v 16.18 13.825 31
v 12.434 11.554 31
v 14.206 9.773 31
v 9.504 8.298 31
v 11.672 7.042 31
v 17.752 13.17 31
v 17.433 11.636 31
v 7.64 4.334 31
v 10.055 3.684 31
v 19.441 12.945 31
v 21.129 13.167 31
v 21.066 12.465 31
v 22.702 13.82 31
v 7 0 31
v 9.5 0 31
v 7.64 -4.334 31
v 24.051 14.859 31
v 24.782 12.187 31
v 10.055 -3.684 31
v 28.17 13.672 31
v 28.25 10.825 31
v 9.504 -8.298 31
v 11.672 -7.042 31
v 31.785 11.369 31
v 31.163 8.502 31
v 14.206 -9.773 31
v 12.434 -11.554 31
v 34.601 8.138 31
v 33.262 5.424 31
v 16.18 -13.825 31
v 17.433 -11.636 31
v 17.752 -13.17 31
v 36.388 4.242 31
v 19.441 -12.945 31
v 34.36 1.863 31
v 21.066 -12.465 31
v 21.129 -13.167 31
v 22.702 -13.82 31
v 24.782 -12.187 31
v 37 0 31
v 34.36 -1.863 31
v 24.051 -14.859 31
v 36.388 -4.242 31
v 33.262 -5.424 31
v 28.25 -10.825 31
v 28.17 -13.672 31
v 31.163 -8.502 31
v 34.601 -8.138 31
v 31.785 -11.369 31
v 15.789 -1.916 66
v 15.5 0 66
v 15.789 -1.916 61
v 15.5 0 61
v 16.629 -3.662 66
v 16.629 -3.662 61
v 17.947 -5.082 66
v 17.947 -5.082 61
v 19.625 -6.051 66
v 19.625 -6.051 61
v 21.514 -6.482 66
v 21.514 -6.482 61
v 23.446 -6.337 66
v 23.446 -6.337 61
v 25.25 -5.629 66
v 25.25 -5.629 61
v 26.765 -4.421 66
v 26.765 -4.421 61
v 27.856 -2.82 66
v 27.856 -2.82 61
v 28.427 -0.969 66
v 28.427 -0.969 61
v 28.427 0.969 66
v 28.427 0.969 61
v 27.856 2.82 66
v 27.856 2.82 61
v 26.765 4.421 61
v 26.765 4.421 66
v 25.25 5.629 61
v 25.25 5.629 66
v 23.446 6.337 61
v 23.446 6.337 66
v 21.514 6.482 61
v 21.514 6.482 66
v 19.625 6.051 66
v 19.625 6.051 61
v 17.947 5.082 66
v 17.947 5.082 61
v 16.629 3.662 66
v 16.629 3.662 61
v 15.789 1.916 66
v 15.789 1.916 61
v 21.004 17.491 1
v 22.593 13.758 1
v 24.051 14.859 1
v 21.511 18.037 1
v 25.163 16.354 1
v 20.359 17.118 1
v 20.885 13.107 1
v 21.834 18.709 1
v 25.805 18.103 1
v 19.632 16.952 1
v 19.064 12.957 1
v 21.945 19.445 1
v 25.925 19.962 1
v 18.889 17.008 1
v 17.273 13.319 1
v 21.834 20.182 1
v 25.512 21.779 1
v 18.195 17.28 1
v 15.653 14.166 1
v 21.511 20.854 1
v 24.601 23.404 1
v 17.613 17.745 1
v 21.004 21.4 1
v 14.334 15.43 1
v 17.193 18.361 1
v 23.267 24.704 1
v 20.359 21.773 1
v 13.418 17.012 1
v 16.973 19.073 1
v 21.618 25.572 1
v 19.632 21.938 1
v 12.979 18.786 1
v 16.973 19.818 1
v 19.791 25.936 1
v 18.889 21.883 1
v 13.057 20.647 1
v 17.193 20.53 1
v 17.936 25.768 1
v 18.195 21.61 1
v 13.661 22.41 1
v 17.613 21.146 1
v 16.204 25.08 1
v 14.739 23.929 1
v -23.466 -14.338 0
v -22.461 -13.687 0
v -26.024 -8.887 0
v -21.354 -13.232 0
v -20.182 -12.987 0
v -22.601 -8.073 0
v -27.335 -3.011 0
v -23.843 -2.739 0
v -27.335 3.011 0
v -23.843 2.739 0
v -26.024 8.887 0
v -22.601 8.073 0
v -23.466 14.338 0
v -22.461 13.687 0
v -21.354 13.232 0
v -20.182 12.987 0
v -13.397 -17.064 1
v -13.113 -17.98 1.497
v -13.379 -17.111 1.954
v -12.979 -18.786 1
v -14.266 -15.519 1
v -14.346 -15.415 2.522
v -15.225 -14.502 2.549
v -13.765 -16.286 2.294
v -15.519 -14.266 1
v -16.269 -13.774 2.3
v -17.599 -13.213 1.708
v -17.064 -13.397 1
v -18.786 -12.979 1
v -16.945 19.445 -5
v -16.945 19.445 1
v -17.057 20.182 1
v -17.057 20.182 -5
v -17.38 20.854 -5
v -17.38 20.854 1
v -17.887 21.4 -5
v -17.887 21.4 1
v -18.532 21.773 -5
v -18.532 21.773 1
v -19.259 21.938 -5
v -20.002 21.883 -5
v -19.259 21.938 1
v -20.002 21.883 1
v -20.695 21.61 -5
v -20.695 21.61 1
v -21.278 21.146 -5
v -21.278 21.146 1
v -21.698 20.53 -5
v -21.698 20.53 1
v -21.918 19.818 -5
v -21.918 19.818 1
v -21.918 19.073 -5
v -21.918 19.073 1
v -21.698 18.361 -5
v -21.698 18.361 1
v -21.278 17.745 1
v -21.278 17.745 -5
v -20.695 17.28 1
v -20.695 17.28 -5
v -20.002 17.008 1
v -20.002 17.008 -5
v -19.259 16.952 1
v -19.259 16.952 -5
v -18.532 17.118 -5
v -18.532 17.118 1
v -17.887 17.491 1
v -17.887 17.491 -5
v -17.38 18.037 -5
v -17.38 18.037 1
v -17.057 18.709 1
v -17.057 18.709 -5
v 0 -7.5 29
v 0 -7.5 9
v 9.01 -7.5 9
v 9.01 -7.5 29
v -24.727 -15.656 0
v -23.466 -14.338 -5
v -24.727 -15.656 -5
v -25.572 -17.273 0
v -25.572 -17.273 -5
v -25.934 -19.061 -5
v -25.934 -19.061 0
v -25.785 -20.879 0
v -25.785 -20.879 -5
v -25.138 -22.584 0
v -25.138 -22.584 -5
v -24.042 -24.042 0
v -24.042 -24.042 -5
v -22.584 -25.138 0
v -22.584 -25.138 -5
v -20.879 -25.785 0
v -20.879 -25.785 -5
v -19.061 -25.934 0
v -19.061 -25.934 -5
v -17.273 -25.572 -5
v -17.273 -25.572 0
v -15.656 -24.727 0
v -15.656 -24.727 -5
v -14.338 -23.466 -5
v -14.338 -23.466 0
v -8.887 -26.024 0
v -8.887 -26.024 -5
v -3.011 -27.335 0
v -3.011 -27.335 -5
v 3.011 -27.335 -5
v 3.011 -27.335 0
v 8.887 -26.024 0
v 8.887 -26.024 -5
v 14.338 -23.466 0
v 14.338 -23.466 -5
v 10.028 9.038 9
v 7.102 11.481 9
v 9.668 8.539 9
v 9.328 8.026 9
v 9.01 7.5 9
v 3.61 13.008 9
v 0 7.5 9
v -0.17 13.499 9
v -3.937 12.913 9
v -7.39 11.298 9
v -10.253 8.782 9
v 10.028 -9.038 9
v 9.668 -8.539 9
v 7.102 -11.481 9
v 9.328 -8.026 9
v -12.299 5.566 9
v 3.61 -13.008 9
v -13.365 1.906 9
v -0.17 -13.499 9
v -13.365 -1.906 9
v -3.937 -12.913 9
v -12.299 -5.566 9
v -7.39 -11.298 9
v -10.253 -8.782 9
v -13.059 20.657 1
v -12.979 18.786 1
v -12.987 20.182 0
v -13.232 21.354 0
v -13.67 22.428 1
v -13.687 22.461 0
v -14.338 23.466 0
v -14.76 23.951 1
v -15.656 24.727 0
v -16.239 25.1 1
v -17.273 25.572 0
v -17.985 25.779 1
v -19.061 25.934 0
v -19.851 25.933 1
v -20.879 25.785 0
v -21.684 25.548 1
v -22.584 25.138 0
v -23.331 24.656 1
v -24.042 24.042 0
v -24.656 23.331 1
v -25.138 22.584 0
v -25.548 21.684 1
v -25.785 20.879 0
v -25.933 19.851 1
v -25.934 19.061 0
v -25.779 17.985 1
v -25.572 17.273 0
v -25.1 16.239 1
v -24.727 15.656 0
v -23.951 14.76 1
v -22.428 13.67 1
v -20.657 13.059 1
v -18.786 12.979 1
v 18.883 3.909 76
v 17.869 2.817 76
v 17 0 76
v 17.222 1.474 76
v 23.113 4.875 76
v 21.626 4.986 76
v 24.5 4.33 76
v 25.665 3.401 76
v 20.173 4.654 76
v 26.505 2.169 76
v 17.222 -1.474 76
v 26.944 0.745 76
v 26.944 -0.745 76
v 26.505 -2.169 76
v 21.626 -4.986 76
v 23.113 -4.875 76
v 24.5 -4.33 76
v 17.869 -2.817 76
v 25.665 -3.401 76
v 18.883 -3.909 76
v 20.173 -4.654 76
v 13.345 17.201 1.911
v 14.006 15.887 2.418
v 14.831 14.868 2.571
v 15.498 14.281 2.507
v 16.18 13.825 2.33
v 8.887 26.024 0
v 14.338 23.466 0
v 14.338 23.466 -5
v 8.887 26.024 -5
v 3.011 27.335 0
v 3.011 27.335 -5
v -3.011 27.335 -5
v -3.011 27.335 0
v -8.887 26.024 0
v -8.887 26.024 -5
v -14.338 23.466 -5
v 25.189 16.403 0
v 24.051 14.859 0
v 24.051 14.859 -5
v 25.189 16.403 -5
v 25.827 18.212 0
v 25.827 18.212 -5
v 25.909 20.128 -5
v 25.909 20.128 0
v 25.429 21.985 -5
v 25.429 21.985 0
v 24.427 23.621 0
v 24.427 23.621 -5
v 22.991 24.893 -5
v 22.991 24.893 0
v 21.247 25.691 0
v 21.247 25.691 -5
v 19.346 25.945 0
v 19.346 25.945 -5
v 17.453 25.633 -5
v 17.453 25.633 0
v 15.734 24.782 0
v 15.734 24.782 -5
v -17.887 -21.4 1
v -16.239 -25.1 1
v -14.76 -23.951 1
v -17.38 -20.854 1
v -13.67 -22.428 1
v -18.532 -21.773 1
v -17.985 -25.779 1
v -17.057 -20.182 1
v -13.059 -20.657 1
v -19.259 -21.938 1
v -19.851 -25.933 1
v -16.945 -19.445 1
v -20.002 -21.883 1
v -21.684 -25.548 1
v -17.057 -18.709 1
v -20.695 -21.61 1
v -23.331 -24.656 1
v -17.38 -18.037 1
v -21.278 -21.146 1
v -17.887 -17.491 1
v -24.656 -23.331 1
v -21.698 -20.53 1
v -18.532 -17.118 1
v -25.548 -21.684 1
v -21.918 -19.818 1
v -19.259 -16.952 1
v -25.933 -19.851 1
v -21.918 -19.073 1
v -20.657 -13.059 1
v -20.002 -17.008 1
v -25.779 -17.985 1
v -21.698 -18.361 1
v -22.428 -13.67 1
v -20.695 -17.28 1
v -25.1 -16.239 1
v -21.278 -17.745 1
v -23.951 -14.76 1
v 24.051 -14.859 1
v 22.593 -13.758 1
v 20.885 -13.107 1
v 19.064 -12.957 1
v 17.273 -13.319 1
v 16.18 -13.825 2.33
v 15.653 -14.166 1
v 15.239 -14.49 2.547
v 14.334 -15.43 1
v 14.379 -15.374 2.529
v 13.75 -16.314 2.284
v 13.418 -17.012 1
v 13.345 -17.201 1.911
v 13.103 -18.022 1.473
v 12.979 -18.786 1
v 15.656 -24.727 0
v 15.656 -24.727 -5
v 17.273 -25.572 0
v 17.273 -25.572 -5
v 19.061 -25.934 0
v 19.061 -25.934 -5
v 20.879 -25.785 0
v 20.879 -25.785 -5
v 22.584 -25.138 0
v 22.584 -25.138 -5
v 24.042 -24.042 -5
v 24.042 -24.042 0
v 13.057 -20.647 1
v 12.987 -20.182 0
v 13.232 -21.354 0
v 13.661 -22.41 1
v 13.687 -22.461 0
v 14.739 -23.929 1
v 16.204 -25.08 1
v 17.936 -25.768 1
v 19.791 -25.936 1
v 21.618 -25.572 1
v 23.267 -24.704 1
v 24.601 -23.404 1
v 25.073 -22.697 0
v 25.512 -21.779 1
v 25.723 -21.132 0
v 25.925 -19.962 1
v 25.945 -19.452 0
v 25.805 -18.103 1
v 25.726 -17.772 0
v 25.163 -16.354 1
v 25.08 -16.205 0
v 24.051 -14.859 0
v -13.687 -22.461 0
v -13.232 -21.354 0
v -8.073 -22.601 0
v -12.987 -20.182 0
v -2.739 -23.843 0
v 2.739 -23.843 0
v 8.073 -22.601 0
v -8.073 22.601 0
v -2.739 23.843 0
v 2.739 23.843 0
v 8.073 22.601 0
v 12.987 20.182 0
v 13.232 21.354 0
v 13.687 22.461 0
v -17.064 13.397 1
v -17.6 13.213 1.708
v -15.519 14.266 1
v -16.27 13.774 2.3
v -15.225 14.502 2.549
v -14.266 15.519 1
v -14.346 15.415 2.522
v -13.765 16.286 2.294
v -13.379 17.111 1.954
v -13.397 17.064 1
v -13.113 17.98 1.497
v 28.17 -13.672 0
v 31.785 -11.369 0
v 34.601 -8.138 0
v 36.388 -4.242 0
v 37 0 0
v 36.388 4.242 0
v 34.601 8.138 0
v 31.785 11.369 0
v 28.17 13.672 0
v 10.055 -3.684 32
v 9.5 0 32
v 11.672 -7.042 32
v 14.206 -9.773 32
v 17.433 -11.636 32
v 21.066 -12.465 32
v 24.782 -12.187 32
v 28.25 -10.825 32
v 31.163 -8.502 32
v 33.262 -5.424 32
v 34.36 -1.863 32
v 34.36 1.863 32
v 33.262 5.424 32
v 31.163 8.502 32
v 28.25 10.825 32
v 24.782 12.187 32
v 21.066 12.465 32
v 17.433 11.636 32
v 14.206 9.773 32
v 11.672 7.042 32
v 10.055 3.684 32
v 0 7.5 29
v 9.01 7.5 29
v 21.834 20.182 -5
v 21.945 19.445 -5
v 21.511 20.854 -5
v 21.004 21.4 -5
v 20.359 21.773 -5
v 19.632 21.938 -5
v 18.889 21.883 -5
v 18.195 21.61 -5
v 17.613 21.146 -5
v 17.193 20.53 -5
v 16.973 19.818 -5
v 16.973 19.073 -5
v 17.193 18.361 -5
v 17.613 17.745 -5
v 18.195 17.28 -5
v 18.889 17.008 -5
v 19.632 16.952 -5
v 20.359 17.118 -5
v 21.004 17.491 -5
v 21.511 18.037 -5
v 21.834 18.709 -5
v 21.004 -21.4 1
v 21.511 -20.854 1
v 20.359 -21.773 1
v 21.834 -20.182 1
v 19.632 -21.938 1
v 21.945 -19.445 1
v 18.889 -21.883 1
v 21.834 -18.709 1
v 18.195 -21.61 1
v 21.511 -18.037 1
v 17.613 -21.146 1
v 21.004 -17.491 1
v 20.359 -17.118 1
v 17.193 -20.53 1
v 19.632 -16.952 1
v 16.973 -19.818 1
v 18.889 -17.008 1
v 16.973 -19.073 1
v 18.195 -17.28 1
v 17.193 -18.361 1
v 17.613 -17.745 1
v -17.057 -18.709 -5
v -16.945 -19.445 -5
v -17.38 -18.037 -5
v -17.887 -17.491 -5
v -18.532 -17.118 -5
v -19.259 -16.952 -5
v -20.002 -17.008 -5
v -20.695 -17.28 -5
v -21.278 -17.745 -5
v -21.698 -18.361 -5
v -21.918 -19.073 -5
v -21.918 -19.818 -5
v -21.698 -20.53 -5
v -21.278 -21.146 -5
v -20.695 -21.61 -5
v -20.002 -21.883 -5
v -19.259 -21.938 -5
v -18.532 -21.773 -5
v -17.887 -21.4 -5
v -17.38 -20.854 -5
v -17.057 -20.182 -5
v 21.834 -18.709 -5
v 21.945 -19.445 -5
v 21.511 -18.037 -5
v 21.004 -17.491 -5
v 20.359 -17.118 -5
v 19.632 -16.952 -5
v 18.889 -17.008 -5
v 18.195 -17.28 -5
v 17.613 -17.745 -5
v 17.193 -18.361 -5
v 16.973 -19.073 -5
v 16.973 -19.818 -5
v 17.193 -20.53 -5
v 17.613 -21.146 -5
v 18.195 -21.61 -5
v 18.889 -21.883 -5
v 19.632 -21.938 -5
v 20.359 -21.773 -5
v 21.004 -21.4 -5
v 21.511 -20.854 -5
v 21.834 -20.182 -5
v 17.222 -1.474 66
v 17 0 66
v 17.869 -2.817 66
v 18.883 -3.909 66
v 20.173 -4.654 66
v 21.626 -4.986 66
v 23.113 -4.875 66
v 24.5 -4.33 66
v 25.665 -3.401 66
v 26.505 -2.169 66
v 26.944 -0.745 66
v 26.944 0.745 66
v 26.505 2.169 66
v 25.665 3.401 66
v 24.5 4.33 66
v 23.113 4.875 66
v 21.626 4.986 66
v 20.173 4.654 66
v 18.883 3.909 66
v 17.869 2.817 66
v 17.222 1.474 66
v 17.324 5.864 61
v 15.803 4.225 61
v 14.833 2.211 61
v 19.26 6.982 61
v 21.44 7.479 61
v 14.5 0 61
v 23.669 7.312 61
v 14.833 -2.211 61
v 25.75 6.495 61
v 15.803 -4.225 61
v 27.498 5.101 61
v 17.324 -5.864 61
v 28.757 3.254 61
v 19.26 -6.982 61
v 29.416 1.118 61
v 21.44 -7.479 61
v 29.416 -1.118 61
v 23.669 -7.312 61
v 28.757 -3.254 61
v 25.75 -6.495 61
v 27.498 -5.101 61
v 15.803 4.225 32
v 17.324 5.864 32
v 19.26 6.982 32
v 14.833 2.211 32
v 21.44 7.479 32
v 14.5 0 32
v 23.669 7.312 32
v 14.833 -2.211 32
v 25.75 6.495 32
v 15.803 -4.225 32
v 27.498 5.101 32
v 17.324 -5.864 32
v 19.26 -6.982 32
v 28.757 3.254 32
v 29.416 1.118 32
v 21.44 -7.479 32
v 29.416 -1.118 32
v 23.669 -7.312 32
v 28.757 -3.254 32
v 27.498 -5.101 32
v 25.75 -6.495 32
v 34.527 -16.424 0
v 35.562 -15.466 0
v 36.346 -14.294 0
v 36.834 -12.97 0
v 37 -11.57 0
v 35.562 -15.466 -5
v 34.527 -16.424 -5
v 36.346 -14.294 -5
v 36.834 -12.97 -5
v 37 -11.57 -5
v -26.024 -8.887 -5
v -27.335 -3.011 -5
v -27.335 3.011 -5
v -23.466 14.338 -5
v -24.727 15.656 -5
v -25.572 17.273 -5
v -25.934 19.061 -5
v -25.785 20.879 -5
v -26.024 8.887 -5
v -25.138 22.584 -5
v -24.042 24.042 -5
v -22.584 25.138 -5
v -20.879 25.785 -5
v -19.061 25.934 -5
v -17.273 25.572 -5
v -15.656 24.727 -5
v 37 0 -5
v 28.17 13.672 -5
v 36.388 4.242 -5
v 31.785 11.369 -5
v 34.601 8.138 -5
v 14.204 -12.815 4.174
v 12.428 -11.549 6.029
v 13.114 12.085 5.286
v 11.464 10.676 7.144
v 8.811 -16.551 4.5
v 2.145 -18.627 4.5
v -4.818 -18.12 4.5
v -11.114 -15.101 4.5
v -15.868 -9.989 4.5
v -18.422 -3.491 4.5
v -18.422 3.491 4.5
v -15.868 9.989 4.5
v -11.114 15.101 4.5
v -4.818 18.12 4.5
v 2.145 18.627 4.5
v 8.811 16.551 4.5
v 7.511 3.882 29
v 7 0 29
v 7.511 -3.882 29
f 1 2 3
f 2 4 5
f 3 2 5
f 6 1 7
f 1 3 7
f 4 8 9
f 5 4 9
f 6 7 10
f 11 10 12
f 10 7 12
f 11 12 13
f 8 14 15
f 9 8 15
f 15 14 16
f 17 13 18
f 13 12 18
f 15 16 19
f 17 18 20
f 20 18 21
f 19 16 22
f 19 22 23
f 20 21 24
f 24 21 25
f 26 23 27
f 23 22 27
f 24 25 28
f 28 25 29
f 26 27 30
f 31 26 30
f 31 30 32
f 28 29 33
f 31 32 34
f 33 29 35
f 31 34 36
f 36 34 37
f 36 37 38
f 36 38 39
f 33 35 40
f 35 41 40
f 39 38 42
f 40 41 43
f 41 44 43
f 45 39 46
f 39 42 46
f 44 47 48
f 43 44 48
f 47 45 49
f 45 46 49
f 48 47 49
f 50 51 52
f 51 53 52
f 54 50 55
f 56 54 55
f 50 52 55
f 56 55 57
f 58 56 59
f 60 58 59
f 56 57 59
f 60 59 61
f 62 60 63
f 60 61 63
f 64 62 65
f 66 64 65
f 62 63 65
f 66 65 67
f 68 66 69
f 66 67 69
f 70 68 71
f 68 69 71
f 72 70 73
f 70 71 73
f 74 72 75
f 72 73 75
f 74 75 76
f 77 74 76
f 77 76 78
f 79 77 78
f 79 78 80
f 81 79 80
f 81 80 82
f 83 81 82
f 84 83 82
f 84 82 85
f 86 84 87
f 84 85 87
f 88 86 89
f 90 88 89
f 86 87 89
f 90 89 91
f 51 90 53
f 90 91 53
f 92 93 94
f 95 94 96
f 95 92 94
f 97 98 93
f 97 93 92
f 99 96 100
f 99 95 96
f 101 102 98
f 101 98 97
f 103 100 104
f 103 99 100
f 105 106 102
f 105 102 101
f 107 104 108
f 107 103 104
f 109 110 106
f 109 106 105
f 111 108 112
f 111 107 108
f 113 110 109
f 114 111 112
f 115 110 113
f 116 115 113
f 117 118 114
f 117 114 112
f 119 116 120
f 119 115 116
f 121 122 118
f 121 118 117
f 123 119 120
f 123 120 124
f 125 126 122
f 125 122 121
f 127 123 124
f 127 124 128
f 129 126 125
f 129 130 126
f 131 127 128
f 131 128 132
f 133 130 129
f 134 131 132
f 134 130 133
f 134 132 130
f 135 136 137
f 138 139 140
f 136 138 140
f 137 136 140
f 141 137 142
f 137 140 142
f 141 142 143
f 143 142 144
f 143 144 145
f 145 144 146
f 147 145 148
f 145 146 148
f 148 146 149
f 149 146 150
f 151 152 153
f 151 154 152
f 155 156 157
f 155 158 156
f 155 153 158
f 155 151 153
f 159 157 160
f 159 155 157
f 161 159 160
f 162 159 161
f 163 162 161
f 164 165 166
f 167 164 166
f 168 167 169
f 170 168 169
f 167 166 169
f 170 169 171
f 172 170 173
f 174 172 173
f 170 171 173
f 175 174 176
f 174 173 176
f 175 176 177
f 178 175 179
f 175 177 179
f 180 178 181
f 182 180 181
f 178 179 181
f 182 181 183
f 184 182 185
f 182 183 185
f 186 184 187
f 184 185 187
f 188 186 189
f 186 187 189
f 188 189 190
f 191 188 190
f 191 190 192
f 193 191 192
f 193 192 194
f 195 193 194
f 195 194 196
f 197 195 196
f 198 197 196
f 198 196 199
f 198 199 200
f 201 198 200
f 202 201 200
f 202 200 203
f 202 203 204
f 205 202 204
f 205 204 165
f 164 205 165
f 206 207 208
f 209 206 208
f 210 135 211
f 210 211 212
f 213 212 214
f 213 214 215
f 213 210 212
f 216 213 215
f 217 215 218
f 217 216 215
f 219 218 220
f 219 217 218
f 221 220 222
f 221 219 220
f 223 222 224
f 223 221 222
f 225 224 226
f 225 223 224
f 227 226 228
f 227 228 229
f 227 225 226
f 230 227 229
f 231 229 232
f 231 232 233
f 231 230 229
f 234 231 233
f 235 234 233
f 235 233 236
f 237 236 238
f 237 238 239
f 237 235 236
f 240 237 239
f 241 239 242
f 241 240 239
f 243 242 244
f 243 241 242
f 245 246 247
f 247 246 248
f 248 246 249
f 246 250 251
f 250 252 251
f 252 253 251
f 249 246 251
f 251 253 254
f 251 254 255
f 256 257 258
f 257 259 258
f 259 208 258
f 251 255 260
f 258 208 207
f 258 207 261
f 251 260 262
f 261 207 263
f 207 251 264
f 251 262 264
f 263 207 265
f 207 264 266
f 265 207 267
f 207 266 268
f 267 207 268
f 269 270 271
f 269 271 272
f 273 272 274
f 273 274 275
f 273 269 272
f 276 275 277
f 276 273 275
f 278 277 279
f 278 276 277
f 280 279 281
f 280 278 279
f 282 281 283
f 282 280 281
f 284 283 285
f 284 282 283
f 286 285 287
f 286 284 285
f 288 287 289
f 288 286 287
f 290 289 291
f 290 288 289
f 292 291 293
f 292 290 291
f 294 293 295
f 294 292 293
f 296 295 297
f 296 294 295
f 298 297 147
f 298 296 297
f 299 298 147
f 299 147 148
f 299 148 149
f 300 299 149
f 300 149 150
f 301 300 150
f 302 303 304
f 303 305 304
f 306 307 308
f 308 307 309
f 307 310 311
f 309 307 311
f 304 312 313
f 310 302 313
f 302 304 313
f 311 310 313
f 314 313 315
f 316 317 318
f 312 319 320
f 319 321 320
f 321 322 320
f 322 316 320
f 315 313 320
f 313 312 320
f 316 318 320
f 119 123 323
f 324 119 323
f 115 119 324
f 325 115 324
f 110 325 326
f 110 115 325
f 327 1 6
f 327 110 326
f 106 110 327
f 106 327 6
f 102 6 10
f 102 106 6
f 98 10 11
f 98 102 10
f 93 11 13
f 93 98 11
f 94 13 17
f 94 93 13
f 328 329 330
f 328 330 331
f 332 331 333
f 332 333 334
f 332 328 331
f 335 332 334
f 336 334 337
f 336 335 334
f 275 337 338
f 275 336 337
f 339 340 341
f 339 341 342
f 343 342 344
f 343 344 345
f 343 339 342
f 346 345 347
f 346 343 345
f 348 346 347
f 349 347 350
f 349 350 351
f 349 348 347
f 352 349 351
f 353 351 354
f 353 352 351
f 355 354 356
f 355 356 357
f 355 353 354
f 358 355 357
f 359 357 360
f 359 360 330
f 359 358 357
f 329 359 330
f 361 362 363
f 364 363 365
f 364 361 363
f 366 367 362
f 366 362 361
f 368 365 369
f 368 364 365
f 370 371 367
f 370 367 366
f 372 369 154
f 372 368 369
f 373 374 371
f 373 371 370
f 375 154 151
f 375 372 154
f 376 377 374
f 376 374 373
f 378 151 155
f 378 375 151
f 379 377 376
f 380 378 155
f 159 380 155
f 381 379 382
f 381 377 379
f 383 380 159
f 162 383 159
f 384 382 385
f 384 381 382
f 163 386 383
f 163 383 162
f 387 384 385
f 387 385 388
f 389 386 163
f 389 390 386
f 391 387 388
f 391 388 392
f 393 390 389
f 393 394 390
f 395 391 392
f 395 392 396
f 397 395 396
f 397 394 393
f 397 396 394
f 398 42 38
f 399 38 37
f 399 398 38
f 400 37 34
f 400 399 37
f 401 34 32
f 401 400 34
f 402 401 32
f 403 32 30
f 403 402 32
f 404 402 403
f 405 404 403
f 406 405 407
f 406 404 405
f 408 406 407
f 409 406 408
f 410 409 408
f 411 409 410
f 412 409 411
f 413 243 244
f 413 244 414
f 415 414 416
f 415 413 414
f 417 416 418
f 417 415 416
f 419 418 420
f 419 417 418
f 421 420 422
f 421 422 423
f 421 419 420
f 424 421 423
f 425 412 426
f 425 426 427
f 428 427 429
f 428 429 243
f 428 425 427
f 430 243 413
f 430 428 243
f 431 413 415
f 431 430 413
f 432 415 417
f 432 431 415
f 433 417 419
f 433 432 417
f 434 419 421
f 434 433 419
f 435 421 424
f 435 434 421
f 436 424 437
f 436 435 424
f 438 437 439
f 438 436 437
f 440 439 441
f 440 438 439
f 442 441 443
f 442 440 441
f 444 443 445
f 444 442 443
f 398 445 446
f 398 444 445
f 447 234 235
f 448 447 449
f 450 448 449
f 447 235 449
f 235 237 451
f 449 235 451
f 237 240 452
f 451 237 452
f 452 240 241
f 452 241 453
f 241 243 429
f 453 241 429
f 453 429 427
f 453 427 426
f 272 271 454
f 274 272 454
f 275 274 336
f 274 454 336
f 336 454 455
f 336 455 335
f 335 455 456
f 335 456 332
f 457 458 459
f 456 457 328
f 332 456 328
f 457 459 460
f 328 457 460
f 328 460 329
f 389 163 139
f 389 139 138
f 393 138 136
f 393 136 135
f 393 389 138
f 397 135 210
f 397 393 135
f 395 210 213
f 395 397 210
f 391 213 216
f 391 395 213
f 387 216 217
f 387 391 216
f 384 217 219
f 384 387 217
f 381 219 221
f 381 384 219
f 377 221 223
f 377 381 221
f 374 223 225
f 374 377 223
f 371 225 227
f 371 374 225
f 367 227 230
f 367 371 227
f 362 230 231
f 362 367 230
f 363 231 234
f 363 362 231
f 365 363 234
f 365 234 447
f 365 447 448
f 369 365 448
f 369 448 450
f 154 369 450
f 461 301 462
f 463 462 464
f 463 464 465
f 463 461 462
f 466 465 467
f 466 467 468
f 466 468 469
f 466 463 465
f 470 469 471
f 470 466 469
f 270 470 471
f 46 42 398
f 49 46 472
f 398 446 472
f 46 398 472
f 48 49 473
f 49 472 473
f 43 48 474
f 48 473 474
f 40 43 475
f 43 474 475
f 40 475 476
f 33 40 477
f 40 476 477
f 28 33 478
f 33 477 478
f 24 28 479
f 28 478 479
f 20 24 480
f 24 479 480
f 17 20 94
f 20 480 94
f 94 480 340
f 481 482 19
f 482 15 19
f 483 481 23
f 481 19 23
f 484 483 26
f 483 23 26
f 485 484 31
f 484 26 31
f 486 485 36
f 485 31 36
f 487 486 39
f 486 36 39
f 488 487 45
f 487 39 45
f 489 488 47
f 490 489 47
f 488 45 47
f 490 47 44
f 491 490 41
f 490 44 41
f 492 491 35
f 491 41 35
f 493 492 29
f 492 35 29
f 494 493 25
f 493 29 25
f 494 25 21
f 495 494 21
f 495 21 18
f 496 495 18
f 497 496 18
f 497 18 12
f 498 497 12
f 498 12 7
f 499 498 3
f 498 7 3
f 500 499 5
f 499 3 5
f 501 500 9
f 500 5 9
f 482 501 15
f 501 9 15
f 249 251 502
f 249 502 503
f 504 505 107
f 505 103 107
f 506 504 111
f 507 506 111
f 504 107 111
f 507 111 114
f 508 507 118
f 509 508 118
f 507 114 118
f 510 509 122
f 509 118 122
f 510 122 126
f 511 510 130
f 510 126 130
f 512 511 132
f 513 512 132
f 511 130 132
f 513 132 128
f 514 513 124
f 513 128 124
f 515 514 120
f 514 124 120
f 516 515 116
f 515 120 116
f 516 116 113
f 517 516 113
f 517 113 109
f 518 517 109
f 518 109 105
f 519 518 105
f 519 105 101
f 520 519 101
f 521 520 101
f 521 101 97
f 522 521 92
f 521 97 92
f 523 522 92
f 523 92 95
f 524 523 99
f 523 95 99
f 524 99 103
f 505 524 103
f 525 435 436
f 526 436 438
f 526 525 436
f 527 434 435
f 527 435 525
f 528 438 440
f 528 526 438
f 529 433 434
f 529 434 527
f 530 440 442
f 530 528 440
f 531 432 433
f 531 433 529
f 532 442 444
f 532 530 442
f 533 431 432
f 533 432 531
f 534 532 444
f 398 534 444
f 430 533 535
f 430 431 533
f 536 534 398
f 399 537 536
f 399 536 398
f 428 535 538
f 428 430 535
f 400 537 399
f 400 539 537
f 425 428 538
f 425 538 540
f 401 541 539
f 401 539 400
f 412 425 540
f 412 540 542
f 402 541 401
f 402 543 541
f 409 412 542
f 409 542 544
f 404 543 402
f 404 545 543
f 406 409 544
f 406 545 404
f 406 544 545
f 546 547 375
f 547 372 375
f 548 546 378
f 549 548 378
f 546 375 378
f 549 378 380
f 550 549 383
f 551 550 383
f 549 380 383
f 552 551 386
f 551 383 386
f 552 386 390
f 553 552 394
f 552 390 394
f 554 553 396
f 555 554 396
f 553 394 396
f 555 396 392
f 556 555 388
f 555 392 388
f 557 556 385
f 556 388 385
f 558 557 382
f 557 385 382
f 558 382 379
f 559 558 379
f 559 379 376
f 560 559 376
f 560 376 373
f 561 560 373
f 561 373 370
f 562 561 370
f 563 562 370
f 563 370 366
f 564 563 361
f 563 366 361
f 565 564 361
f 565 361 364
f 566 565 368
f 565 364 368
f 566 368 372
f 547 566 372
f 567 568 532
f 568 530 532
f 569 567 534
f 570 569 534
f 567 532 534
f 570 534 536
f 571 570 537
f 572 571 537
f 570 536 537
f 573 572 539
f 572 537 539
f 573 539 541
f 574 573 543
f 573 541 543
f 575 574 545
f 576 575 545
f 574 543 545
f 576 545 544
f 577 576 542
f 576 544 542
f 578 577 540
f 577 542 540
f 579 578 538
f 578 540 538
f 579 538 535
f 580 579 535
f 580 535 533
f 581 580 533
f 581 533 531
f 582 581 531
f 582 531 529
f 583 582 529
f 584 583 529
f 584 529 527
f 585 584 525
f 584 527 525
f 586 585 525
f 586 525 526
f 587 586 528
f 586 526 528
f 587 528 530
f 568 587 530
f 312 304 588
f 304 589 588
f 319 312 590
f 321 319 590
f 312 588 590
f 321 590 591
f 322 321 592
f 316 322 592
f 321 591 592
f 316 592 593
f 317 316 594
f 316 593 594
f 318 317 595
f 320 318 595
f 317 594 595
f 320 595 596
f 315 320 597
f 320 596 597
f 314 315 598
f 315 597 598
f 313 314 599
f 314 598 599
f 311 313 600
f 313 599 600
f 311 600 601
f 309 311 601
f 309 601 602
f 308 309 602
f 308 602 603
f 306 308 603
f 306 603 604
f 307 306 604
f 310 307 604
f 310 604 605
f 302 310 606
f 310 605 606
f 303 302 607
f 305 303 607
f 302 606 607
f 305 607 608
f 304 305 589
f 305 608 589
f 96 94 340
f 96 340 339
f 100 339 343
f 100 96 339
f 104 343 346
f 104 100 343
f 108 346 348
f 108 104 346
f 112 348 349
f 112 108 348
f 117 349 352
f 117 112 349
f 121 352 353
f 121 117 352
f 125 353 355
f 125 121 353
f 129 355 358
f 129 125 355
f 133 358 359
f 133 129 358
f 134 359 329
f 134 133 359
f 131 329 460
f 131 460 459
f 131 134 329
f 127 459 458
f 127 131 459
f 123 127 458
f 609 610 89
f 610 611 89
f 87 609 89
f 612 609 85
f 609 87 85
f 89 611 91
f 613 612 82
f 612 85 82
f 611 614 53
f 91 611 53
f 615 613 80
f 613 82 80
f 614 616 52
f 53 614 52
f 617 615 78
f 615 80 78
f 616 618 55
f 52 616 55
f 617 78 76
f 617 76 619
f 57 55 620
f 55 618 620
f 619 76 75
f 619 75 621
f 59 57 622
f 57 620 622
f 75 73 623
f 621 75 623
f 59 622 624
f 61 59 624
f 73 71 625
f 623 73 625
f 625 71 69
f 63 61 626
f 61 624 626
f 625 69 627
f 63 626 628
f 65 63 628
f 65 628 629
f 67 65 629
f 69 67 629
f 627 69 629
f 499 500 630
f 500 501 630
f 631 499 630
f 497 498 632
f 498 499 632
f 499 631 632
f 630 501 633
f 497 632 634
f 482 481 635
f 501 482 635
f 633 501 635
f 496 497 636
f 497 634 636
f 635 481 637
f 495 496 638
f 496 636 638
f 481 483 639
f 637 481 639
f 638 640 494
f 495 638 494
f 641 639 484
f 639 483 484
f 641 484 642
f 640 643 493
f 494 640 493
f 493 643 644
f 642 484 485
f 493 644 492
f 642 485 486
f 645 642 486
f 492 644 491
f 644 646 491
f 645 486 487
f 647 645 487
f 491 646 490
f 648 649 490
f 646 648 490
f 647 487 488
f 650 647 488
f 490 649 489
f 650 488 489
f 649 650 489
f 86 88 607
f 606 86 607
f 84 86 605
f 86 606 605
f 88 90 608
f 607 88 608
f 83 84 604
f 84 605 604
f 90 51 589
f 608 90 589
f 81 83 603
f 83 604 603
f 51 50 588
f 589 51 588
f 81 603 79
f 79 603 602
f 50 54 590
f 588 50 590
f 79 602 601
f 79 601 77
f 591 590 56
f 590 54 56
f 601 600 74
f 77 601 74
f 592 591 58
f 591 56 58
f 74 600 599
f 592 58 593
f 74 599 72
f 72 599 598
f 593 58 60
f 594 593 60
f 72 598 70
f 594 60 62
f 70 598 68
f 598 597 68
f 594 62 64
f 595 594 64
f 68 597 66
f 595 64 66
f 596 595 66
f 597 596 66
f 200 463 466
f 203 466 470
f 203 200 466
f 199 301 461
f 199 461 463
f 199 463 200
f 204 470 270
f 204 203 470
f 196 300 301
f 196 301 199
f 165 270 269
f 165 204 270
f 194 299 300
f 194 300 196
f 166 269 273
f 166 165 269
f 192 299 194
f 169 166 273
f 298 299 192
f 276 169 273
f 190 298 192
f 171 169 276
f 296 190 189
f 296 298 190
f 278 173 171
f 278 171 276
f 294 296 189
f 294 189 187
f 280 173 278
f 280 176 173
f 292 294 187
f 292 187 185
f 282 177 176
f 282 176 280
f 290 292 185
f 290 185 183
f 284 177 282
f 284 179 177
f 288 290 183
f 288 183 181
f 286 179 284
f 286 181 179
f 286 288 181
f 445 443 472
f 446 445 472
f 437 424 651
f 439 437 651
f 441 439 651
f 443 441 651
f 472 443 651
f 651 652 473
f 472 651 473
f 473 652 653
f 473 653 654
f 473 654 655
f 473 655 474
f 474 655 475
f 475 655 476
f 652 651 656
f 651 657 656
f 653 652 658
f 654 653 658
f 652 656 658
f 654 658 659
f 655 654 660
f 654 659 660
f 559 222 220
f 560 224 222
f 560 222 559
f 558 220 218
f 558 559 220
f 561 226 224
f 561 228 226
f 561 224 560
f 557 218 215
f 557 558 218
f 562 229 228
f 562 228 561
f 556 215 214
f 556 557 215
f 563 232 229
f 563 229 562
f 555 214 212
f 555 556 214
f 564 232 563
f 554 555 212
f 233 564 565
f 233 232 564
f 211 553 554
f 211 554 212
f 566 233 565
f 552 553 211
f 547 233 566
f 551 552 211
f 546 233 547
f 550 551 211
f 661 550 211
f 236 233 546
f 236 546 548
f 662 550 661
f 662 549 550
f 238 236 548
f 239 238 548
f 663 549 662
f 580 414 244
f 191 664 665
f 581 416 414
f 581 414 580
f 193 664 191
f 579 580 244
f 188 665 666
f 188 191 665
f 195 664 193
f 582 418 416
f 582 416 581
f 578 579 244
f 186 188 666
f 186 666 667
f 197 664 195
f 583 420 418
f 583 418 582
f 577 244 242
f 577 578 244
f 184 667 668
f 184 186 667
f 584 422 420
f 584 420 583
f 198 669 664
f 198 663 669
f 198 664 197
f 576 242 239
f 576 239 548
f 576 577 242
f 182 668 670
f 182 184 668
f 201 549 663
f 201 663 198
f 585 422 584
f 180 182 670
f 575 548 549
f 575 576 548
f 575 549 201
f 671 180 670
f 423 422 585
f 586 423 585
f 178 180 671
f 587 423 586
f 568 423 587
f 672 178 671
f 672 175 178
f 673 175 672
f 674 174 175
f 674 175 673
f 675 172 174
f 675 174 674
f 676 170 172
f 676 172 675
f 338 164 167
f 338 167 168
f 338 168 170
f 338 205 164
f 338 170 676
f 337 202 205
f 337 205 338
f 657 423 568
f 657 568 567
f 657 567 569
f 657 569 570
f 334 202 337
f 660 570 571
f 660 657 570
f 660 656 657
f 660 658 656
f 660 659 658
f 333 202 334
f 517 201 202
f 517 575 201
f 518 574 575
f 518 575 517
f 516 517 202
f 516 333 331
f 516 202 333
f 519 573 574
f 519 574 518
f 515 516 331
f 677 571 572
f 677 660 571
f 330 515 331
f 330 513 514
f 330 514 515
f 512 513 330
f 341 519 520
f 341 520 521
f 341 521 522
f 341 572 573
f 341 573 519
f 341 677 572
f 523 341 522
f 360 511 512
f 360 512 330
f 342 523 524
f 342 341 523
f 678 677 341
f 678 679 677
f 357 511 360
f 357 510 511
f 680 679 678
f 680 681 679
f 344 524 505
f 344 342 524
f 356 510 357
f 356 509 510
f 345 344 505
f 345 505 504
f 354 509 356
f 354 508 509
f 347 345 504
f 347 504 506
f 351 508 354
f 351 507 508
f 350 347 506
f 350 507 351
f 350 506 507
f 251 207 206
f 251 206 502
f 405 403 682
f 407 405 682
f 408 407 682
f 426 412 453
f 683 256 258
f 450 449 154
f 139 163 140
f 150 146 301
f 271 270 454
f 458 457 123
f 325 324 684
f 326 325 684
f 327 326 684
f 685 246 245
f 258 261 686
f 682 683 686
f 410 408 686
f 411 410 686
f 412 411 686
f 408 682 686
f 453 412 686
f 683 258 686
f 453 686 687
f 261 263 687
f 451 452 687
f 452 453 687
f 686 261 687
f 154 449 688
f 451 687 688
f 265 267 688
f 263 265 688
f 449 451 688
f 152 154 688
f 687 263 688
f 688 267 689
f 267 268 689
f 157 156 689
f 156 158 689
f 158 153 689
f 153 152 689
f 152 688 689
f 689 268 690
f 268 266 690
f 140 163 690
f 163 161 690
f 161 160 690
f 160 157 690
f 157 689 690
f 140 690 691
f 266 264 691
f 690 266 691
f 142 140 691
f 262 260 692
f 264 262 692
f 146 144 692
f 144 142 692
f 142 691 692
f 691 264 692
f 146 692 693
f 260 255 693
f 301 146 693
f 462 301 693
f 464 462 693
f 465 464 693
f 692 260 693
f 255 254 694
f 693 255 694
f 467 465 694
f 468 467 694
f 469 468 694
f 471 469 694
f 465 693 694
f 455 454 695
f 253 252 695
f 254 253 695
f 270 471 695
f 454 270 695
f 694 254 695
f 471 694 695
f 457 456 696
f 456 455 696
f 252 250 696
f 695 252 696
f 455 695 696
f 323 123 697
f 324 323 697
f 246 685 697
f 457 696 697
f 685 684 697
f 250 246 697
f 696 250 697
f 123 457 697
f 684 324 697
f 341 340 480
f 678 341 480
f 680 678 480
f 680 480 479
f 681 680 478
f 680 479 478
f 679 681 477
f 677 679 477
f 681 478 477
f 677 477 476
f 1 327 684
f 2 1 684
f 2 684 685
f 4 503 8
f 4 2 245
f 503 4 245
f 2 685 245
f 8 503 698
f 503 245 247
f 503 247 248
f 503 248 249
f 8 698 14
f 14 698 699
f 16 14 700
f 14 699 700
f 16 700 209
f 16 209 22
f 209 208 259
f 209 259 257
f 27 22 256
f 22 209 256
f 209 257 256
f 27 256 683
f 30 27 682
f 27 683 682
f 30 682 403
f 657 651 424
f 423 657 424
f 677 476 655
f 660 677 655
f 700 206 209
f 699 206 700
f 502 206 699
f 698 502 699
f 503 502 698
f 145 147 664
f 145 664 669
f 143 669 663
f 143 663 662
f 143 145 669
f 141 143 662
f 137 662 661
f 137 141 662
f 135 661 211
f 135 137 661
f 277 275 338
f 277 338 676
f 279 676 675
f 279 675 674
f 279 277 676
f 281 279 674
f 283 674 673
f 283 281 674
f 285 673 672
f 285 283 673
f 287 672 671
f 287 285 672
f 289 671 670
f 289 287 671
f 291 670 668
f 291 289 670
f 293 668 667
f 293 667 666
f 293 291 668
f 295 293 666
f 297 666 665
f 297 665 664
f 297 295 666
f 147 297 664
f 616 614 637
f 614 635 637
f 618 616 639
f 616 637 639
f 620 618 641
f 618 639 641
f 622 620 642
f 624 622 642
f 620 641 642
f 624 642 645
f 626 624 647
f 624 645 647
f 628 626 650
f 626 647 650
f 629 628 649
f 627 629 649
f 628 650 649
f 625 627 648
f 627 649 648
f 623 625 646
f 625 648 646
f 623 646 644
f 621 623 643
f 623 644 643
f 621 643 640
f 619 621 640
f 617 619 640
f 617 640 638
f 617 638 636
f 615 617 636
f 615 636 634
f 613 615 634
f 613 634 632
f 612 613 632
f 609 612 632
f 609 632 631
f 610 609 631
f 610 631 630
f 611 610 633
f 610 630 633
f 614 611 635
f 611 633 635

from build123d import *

# Parameters (mm, degrees)
SKETCH1_R           = 2.5
BOSS_EXTRUDE1_DEPTH = 5
BOSS_EXTRUDE2_START = -5
BOSS_EXTRUDE2_DEPTH = 5
SKETCH8_W           = 9.009618943
SKETCH8_H           = 15
BOSS_EXTRUDE3_DEPTH = 20
SKETCH1_3_R         = 6.5
CUT_EXTRUDE1_DEPTH  = 89.888975736
FILLET1_R           = 6
BOSS_EXTRUDE4_START = 1
SKETCH1_4_R         = 6.5
SKETCH1_4_R_2       = 2.5
BOSS_EXTRUDE4_DEPTH = 1


with BuildPart() as part:
    # Sketch1 → Boss-Extrude1 (new body)
    with BuildSketch(Plane(origin=(0, 0, 0), x_dir=(0, 1, 0), z_dir=(0, 0, 1))):
        with BuildLine():
            ThreePointArc((23.466233734, -14.338266086), (27.5, 0), (23.466233734, 14.338266086))
            ThreePointArc((23.466233734, 14.338266086), (24.04163056, 24.04163056), (14.338266086, 23.466233734))
            ThreePointArc((14.338266086, 23.466233734), (0, 27.5), (-14.338266086, 23.466233734))
            ThreePointArc((-14.338266086, 23.466233734), (-24.04163056, 24.04163056), (-23.466233734, 14.338266086))
            ThreePointArc((-23.466233734, 14.338266086), (-27.5, 0), (-23.466233734, -14.338266086))
            ThreePointArc((-23.466233734, -14.338266086), (-24.04163056, -24.04163056), (-14.338266086, -23.466233734))
            ThreePointArc((-14.338266086, -23.466233734), (0, -27.5), (14.338266086, -23.466233734))
            ThreePointArc((14.338266086, -23.466233734), (24.04163056, -24.04163056), (23.466233734, -14.338266086))
        make_face()
        with Locations(Location((-19.445436483, 19.445436483, 0), (0, 0, 270))):
            Circle(SKETCH1_R, mode=Mode.SUBTRACT)
        with Locations(Location((19.445436483, 19.445436483, 0), (0, 0, 270))):
            Circle(SKETCH1_R, mode=Mode.SUBTRACT)
        with Locations(Location((19.445436483, -19.445436483, 0), (0, 0, 270))):
            Circle(SKETCH1_R, mode=Mode.SUBTRACT)
        with Locations(Location((-19.445436483, -19.445436483, 0), (0, 0, 270))):
            Circle(SKETCH1_R, mode=Mode.SUBTRACT)
    extrude(amount=-BOSS_EXTRUDE1_DEPTH)

    # Sketch5 → Revolve1 (revolve)
    with BuildSketch(Plane.YZ, mode=Mode.PRIVATE) as revolve1_sk:
        Polygon((0, 0), (24, 0), (13.5, 9), (0, 9), align=None)
    revolve(revolve1_sk.sketch.rotate(Axis((0, 0, 9), (0, 0, -1)), 180), axis=Axis((0, 0, 9), (0, 0, -1)))

    # Sketch6 → Boss-Extrude2 (add)
    with BuildSketch(Plane.YX.offset(5).offset(BOSS_EXTRUDE2_START)):
        with BuildLine():
            ThreePointArc((0, 37), (-9.854658782, 33.30865599), (-14.859059475, 24.051426706))
            ThreePointArc((-14.859059475, 24.051426706), (-14.589838885, 23.766683059), (-14.338266086, 23.466233734))
            ThreePointArc((-14.338266086, 23.466233734), (-7.447434871, 26.472357542), (0, 27.5))
            Line((0, 27.5), (0, 37))
        make_face()
        with BuildLine():
            ThreePointArc((14.859059475, 24.051426706), (9.854658782, 33.30865599), (0, 37))
            Line((0, 37), (0, 27.5))
            ThreePointArc((0, 27.5), (7.447434871, 26.472357542), (14.338266086, 23.466233734))
            ThreePointArc((14.338266086, 23.466233734), (14.589838885, 23.766683059), (14.859059475, 24.051426706))
        make_face()
        with BuildLine():
            Line((-14.626824069, 37), (-24.04163056, 24.04163056))
            ThreePointArc((-24.04163056, 24.04163056), (-19.452370805, 25.945432784), (-14.859059475, 24.051426706))
            ThreePointArc((-14.859059475, 24.051426706), (-9.854658782, 33.30865599), (0, 37))
            Line((0, 37), (-14.626824069, 37))
        make_face()
        with BuildLine():
            ThreePointArc((-14.338266086, 23.466233734), (-14.589838885, 23.766683059), (-14.859059475, 24.051426706))
            ThreePointArc((-14.859059475, 24.051426706), (-1.028131286, 7.035276613), (15, 22))
            ThreePointArc((15, 22), (14.964723387, 23.028131286), (14.859059475, 24.051426706))
            ThreePointArc((14.859059475, 24.051426706), (14.589838885, 23.766683059), (14.338266086, 23.466233734))
            ThreePointArc((14.338266086, 23.466233734), (7.447434871, 26.472357542), (0, 27.5))
            ThreePointArc((0, 27.5), (-7.447434871, 26.472357542), (-14.338266086, 23.466233734))
        make_face()
    extrude(amount=BOSS_EXTRUDE2_DEPTH)

    # Sketch7 → Revolve2 (revolve)
    with BuildSketch(Plane(origin=(0, 0, 0), x_dir=(-1, 0, 0), z_dir=(0, 1, 0)), mode=Mode.PRIVATE) as revolve2_sk:
        Polygon((-22, 0), (-22, 76), (-27, 76), (-27, 66), (-28.5, 66), (-28.5, 61), (-29.5, 61), (-29.5, 32), (-34.5, 32), (-34.5, 31), (-37, 31), (-37, 0), align=None)
    revolve(revolve2_sk.sketch.rotate(Axis((22, 0, 0), (0, 0, 1)), 180), axis=Axis((22, 0, 0), (0, 0, 1)))

    # Sketch8 → Boss-Extrude3 (add)
    with BuildSketch(Plane.XY.offset(9)):
        with Locations((4.504809472, 0)):
            Rectangle(SKETCH8_W, SKETCH8_H)
    extrude(amount=BOSS_EXTRUDE3_DEPTH)

    # Sketch1<3> → Cut-Extrude1 (cut, through all)
    with BuildSketch(Plane(origin=(0, 0, 0), x_dir=(0, 1, 0), z_dir=(0, 0, 1))):
        with Locations((19.445436483, 19.445436483)):
            Circle(SKETCH1_3_R)
        with Locations((-19.445436483, 19.445436483)):
            Circle(SKETCH1_3_R)
        with Locations((-19.445436483, -19.445436483)):
            Circle(SKETCH1_3_R)
        with Locations((19.445436483, -19.445436483)):
            Circle(SKETCH1_3_R)
    extrude(amount=CUT_EXTRUDE1_DEPTH, mode=Mode.SUBTRACT)

    # Fillet1
    fillet1_edges = [part.edges().sort_by_distance(p)[0] for p in [
        (37, -14.626824069, -2.5),
    ]]
    fillet(fillet1_edges, radius=FILLET1_R)

    # Sketch1<4> → Boss-Extrude4 (add)
    # profile 1 of 4: a face of its own
    with BuildSketch(Plane(origin=(0, 0, 0), x_dir=(0, 1, 0), z_dir=(0, 0, 1)).offset(BOSS_EXTRUDE4_START)):
        with Locations((19.445436483, 19.445436483)):
            Circle(SKETCH1_4_R)
        with Locations(Location((19.445436483, 19.445436483, 0), (0, 0, 270))):
            Circle(SKETCH1_4_R_2, mode=Mode.SUBTRACT)
    # profile 2 of 4: a face of its own
    with BuildSketch(Plane(origin=(0, 0, 0), x_dir=(0, 1, 0), z_dir=(0, 0, 1)).offset(BOSS_EXTRUDE4_START)):
        with Locations((19.445436483, -19.445436483)):
            Circle(SKETCH1_4_R)
        with Locations(Location((19.445436483, -19.445436483, 0), (0, 0, 270))):
            Circle(SKETCH1_4_R_2, mode=Mode.SUBTRACT)
    # profile 3 of 4: a face of its own
    with BuildSketch(Plane(origin=(0, 0, 0), x_dir=(0, 1, 0), z_dir=(0, 0, 1)).offset(BOSS_EXTRUDE4_START)):
        with Locations((-19.445436483, 19.445436483)):
            Circle(SKETCH1_4_R)
        with Locations(Location((-19.445436483, 19.445436483, 0), (0, 0, 270))):
            Circle(SKETCH1_4_R_2, mode=Mode.SUBTRACT)
    # profile 4 of 4: a face of its own
    with BuildSketch(Plane(origin=(0, 0, 0), x_dir=(0, 1, 0), z_dir=(0, 0, 1)).offset(BOSS_EXTRUDE4_START)):
        with Locations((-19.445436483, -19.445436483)):
            Circle(SKETCH1_4_R)
        with Locations(Location((-19.445436483, -19.445436483, 0), (0, 0, 270))):
            Circle(SKETCH1_4_R_2, mode=Mode.SUBTRACT)
    extrude(amount=-BOSS_EXTRUDE4_DEPTH)


solid = part.part
